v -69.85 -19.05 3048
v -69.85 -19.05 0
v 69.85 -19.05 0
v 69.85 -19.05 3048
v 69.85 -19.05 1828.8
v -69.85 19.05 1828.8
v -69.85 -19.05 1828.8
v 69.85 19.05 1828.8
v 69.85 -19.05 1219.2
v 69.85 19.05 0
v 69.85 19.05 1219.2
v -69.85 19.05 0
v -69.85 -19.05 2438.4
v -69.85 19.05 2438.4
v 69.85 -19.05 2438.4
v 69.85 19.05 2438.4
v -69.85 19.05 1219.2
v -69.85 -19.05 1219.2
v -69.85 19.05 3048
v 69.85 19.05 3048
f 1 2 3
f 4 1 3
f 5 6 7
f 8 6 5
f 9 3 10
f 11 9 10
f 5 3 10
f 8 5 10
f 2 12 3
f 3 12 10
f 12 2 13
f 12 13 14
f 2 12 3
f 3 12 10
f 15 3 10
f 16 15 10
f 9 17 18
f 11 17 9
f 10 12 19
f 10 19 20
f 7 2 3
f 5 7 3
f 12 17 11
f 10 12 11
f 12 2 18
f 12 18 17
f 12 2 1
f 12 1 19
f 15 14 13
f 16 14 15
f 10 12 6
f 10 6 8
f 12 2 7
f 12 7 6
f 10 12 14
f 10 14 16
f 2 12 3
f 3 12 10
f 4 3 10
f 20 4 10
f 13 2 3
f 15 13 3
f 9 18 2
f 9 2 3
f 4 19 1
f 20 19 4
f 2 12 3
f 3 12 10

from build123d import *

# Parameters (mm, degrees)
F0_W     = 139.7
F0_H     = 38.1
F1_DEPTH = 3048
F2_DEPTH = 2438.4
F3_DEPTH = 1828.8
F4_DEPTH = 1219.2


with BuildPart() as f1:
    # F0 (on Top) → F1 (new body)
    with BuildSketch(Plane.XY):
        Rectangle(F0_W, F0_H)
    extrude(amount=F1_DEPTH)


with BuildPart() as f2:
    # F0 (on Top) → F2 (new body)
    with BuildSketch(Plane.XY):
        Rectangle(F0_W, F0_H)
    extrude(amount=F2_DEPTH)


with BuildPart() as f3:
    # F0 (on Top) → F3 (new body)
    with BuildSketch(Plane.XY):
        Rectangle(F0_W, F0_H)
    extrude(amount=F3_DEPTH)


with BuildPart() as f4:
    # F0 (on Top) → F4 (new body)
    with BuildSketch(Plane.XY):
        Rectangle(F0_W, F0_H)
    extrude(amount=F4_DEPTH)


solid = Compound([f1.part, f2.part, f3.part, f4.part])
